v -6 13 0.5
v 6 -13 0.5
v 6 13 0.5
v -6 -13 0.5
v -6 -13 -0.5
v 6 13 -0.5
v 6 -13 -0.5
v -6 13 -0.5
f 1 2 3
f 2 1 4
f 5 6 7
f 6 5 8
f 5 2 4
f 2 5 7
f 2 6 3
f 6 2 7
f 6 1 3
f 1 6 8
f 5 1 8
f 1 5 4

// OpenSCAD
module battery(){
     color("red")
     cube([12,26,1],center=true);
}

battery();
